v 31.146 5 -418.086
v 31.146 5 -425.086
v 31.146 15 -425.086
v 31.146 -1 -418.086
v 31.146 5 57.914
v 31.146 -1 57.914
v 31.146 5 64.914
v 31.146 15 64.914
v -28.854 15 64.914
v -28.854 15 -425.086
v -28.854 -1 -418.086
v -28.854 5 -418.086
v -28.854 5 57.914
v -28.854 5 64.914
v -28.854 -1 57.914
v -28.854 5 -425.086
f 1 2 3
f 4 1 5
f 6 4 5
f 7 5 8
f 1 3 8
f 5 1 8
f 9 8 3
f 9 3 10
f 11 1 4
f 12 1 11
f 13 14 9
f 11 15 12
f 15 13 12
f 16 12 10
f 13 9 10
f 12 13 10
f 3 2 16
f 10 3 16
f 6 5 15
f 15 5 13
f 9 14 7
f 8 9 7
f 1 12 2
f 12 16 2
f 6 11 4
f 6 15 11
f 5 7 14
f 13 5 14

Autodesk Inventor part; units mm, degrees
ref_plane "YZ Plane" through (0, 0, 0) normal (1, 0, 0) x (0, 1, 0)
ref_plane "XZ Plane" through (0, 0, 0) normal (0, 1, 0) x (-1, 0, 0)
ref_plane "XY Plane" through (0, 0, 0) normal (0, 0, 1) x (1, 0, 0)
sketch "Sketch1" plane through (0, 0, 0) normal (0, 1, 0) x (-1, 0, 0)
  line L0 (28.8538, 64.9138) -> (-31.1462, 64.9138)
  line L1 (-31.1462, 64.9138) -> (-31.1462, -425.0862)
  line L2 (-31.1462, -425.0862) -> (28.8538, -425.0862)
  line L3 (28.8538, -425.0862) -> (28.8538, 64.9138)
  point P0 (0, 0)
  dimension "d0" = 60
  dimension "d1" = 490
extrude "Extrusion1" add sketch "Sketch1" along normal blind 15
sketch "Sketch2" plane through (-28.8538, 0, 64.9138) normal (0, 0, 1) x (1, 0, 0)
  line L0 (60, 0) -> (0, 0) projected
  line L1 (0, 0) -> (60, 0)
  line L2 (60, 0) -> (60, 5)
  line L3 (60, 5) -> (0, 5)
  line L4 (0, 5) -> (0, 0)
  point P0 (28.8538, 0)
  point P1 (60, 0)
  dimension "d4" = 60
  dimension "d5" = 5
extrude "Extrusion2" cut sketch "Sketch2" against normal blind 7
sketch "Sketch3" plane through (31.1462, 0, -425.0862) normal (0, 0, -1) x (-1, 0, 0)
  line L0 (0, 0) -> (60, 0) projected
  line L1 (0, 0) -> (60, 0)
  line L2 (60, 0) -> (60, 5)
  line L3 (60, 5) -> (0, 5)
  line L4 (0, 5) -> (0, 0)
  point P0 (31.1462, 0)
  point P1 (60, 0)
  dimension "d8" = 60
  dimension "d9" = 5
extrude "Extrusion3" cut sketch "Sketch3" against normal blind 7
sketch "Sketch4" plane through (0, 0, 0) normal (0, -1, 0) x (1, 0, 0)
  line L0 (31.1462, 57.9138) -> (-28.8538, 57.9138) projected
  line L1 (31.1462, -418.0862) -> (-28.8538, -418.0862) projected
  line L2 (31.1462, 57.9138) -> (-28.8538, 57.9138)
  line L3 (-28.8538, 57.9138) -> (-28.8538, -418.0862)
  line L4 (-28.8538, -418.0862) -> (31.1462, -418.0862)
  line L5 (31.1462, -418.0862) -> (31.1462, 57.9138)
  point P0 (0, 0)
extrude "Extrusion4" add sketch "Sketch4" along normal blind 1
properties part number "Arcade_MonitorStand"
